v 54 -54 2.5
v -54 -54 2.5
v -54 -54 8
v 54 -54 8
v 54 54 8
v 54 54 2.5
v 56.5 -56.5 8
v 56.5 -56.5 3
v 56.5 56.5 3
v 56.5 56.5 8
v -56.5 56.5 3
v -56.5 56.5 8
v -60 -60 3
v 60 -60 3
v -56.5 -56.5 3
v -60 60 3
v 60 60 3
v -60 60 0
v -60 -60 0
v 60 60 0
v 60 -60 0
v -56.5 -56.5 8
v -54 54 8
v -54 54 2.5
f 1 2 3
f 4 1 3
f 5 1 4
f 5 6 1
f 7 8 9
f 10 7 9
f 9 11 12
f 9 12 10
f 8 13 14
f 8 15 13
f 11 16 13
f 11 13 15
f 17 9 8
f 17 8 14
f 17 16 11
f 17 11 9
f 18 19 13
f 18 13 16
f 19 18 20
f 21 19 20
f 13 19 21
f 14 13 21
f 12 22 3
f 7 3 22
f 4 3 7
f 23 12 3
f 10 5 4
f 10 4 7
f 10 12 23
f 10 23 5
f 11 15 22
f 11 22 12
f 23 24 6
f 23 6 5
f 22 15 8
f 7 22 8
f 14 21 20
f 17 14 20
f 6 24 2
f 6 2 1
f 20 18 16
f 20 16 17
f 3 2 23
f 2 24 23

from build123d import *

# Parameters (mm, degrees)
F0_W        = 120
F0_H        = 120
F1_DEPTH    = 3
F2_W        = 113
F2_H        = 113
F3_DEPTH    = 5
F4_T        = 2.5
F4_T3_DEPTH = 118
F4_T5_DEPTH = 118


# Not quite as in the source:
# - a shell that OpenCascade refuses in one call is made with other operations: the cavity is built on its own and cut out


with BuildPart() as f1:
    # F0 (on Top) → F1 (new body)
    with BuildSketch(Plane.XY):
        Rectangle(F0_W, F0_H)
    extrude(amount=F1_DEPTH)

    # F2 (on face) → F3 (join)
    with BuildSketch(Plane.XY.offset(3)):
        Rectangle(F2_W, F2_H)
    extrude(amount=F3_DEPTH)

    # F4: shell of thickness 2.5, made by hand


with BuildPart() as f4_core1:
    # F4_t2: copy of F1
    add(f1.part)

    # the walls: a layer under each face that stays
    f4_faces = [f4_core1.faces().sort_by_distance(p)[0] for p in [
        (0, -60, 1.5),
        (-60, 0, 1.5),
        (60, 0, 1.5),
        (0, 0, 0),
        (41.25, -58.5185185185, 3),
        (0, 60, 1.5),
        (0, -56.5, 5.5),
        (56.5, 0, 5.5),
        (0, 56.5, 5.5),
        (-56.5, 0, 5.5),
    ]]
    thicken(f4_faces, amount=-F4_T, mode=Mode.SUBTRACT)

    # F4_s4 → F4_t3 (cut)
    with BuildSketch(Plane.YZ.offset(-59)):
        Polygon((-56.525, 3.025), (-56.5, 0.5), (-54, 0.5), (-54, 3), align=None)
        Polygon((56.525, 3.025), (56.5, 0.5), (54, 0.5), (54, 3), align=None)
    extrude(amount=F4_T3_DEPTH, mode=Mode.SUBTRACT)

    # F4_s6 → F4_t5 (cut)
    with BuildSketch(Plane.XZ.offset(-59)):
        Polygon((56.525, 3.025), (56.5, 0.5), (54, 0.5), (54, 3), align=None)
        Polygon((-56.525, 3.025), (-56.5, 0.5), (-54, 0.5), (-54, 3), align=None)
    extrude(amount=F4_T5_DEPTH, mode=Mode.SUBTRACT)


with BuildPart() as f1_1:
    add(f1.part)

    # what is left inside the walls is the cavity
    f4_cavity = [f4_core1.part.solids().sort_by_distance(p)[0] for p in [
        (0, -18, 2.525),
    ]]
    add(f4_cavity, mode=Mode.SUBTRACT)


solid = f1_1.part
